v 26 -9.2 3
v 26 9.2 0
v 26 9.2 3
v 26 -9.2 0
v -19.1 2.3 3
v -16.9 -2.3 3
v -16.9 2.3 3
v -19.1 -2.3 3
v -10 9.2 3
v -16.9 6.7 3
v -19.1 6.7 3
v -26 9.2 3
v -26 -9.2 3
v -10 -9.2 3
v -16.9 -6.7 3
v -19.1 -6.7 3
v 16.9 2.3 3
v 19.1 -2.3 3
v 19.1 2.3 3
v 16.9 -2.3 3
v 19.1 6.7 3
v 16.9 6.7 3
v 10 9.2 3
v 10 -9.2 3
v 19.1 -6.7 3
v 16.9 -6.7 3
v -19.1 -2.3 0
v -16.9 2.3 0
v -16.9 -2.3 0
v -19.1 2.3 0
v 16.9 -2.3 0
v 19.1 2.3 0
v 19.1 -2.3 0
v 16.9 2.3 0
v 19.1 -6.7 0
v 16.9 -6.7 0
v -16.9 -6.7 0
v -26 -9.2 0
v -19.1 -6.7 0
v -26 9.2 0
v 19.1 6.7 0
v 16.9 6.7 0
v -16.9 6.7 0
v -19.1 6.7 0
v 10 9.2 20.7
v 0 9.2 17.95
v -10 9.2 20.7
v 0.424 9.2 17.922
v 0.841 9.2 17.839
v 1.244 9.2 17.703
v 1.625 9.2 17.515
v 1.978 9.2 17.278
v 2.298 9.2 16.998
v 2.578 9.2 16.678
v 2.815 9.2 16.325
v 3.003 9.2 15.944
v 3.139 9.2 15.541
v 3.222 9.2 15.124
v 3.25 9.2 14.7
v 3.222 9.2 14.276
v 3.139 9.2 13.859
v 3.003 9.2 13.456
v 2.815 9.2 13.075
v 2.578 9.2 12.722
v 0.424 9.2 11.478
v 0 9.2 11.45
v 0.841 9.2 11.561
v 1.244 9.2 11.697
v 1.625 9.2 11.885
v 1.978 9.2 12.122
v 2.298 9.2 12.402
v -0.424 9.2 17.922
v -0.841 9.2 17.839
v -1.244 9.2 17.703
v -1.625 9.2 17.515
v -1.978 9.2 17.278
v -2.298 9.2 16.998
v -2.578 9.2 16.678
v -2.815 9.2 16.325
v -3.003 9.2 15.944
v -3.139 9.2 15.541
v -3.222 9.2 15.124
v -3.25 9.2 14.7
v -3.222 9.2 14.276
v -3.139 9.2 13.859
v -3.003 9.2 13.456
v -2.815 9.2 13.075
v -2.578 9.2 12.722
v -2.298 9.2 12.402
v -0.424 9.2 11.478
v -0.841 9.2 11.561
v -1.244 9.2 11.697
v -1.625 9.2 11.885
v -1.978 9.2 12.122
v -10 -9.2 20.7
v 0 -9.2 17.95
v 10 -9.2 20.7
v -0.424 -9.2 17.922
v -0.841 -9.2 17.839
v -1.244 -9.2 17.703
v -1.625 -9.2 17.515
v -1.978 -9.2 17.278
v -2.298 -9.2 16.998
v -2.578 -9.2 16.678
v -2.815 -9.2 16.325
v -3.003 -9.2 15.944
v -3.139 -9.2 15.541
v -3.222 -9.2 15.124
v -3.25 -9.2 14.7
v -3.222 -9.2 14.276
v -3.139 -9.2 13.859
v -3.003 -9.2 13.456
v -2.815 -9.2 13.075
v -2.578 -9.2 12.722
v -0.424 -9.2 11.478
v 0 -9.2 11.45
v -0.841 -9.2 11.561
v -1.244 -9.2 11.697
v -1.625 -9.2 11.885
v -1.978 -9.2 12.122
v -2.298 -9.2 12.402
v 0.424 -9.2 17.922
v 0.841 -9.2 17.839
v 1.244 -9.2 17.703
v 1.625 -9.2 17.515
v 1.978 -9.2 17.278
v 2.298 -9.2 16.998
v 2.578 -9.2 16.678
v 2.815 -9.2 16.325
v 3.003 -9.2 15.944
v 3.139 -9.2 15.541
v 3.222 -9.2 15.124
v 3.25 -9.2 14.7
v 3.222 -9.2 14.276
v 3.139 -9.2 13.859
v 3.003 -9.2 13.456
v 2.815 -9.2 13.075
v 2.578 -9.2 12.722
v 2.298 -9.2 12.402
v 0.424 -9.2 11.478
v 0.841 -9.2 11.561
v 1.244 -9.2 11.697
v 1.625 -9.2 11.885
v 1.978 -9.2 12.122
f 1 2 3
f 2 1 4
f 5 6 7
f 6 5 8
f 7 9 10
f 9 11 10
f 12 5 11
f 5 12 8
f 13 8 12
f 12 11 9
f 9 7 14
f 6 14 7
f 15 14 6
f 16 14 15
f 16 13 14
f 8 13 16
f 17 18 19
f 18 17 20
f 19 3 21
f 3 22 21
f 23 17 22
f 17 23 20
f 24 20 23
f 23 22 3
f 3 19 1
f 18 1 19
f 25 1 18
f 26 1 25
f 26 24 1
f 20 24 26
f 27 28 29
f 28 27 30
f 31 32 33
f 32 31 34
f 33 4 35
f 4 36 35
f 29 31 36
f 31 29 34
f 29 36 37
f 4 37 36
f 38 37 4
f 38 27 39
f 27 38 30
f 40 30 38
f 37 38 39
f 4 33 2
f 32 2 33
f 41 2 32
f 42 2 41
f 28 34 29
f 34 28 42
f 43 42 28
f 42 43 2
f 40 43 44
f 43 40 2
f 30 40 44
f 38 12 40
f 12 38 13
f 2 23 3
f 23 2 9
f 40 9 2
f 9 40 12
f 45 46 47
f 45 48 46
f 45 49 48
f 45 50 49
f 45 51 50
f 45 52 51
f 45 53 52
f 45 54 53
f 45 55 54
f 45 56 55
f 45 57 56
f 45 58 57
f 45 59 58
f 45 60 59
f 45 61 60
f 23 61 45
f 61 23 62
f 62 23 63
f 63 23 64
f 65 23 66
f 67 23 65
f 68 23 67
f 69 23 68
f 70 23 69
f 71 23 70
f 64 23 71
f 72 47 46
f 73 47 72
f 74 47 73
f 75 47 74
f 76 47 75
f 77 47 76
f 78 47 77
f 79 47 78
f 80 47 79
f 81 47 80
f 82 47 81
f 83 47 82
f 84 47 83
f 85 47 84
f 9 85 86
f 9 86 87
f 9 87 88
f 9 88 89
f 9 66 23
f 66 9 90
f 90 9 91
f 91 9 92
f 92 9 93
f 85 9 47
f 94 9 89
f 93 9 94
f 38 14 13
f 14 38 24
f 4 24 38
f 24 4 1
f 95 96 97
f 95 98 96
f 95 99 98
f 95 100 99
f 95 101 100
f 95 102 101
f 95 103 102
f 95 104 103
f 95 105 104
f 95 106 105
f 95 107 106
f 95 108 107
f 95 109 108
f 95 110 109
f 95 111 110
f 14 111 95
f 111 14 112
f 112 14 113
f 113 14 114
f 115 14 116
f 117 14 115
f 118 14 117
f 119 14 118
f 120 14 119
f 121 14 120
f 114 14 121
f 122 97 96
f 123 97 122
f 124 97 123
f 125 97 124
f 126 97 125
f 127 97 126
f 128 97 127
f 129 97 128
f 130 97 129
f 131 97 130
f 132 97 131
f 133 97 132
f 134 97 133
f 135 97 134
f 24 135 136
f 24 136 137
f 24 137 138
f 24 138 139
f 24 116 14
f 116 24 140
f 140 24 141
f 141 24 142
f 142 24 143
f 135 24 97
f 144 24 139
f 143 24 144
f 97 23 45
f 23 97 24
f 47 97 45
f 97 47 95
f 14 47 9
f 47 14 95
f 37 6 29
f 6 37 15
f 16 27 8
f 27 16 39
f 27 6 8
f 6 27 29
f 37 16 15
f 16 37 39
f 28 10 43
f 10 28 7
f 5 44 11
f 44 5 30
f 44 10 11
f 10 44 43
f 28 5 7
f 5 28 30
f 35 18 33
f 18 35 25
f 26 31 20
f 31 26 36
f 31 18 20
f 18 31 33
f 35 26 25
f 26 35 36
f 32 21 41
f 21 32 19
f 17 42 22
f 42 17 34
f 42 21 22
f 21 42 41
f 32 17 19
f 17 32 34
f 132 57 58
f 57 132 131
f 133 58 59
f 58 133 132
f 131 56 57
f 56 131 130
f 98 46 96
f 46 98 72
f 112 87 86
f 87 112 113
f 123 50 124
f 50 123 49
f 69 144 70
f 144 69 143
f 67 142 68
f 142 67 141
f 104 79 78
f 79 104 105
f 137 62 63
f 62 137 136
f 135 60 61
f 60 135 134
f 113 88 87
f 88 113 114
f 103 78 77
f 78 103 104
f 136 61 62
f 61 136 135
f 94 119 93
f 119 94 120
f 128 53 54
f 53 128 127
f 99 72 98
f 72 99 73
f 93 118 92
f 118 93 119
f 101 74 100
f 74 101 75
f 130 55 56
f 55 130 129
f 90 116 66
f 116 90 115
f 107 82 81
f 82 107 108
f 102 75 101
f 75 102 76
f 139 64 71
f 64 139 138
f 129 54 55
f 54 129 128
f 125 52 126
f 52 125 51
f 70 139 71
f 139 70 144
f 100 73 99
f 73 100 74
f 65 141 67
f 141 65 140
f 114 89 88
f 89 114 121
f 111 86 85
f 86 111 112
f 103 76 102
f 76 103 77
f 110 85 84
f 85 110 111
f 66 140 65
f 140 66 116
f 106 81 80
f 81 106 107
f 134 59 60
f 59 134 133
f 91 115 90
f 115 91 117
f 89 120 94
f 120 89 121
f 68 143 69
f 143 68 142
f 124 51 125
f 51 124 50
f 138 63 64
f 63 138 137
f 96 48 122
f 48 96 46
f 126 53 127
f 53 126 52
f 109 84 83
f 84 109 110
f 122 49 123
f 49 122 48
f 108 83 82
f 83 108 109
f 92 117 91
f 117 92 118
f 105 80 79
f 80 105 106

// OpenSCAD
// ======================================================================
//  ТРИМАЧ ДОВГОЇ ОСІ · sosny · Т-150
//  Із free_wheel.scad holder:
//   - уздовж осі звужений на 7 мм: 25.4 -> 18.4 мм;
//   - бічну полицю (йшла під колесо) прибрано: полиця тепер тільки
//     вперед/назад уздовж руху і не ширша за блок, тож колеса з обох боків
//     нічого не чіпають (зазор до маточини ~1.8 мм, там шайби).
//  Вісь — одна на два колеса: scad/wheel_axle_double.scad (holder_w = 18.4).
//  Друкувати 1 тримач на вісь.
//  Друк: PLA 0.28, 3 стінки, 30 %, полицею на стіл, без підтримок.
// ======================================================================

ax_d     = 6;      // вал осі
hole_fit = 0.5;    // отвір Ø6.5 — вісь крутиться вільно
block_x  = 20;     // блок уздовж руху
block_y  = 18.4;   // було 25.4 (-7 мм) — довжина отвору під вісь
axle_z   = 14.7;   // від рами до центру осі (= вал TT)
below    = 6;
flange_len = 52;   // полиця вздовж руху (по 16 мм з кожного боку блоку)
flange_t = 3;
slot_l = 4.4; slot_w = 2.2;   // прорізи під стяжки
$fn = 48;

module holder() {
    difference() {
        union() {
            translate([-flange_len/2, -block_y/2, 0]) cube([flange_len, block_y, flange_t]);
            translate([-block_x/2, -block_y/2, 0]) cube([block_x, block_y, axle_z + below]);
        }
        translate([0, 0, axle_z]) rotate([90, 0, 0])
            cylinder(d = ax_d + hole_fit, h = block_y + 2, center = true);
        for (x = [-1, 1]*(block_x/2 + 8), y = [-1, 1]*4.5)
            translate([x - slot_w/2, y - slot_l/2, -1]) cube([slot_w, slot_l, flange_t + 2]);
    }
}

holder();
